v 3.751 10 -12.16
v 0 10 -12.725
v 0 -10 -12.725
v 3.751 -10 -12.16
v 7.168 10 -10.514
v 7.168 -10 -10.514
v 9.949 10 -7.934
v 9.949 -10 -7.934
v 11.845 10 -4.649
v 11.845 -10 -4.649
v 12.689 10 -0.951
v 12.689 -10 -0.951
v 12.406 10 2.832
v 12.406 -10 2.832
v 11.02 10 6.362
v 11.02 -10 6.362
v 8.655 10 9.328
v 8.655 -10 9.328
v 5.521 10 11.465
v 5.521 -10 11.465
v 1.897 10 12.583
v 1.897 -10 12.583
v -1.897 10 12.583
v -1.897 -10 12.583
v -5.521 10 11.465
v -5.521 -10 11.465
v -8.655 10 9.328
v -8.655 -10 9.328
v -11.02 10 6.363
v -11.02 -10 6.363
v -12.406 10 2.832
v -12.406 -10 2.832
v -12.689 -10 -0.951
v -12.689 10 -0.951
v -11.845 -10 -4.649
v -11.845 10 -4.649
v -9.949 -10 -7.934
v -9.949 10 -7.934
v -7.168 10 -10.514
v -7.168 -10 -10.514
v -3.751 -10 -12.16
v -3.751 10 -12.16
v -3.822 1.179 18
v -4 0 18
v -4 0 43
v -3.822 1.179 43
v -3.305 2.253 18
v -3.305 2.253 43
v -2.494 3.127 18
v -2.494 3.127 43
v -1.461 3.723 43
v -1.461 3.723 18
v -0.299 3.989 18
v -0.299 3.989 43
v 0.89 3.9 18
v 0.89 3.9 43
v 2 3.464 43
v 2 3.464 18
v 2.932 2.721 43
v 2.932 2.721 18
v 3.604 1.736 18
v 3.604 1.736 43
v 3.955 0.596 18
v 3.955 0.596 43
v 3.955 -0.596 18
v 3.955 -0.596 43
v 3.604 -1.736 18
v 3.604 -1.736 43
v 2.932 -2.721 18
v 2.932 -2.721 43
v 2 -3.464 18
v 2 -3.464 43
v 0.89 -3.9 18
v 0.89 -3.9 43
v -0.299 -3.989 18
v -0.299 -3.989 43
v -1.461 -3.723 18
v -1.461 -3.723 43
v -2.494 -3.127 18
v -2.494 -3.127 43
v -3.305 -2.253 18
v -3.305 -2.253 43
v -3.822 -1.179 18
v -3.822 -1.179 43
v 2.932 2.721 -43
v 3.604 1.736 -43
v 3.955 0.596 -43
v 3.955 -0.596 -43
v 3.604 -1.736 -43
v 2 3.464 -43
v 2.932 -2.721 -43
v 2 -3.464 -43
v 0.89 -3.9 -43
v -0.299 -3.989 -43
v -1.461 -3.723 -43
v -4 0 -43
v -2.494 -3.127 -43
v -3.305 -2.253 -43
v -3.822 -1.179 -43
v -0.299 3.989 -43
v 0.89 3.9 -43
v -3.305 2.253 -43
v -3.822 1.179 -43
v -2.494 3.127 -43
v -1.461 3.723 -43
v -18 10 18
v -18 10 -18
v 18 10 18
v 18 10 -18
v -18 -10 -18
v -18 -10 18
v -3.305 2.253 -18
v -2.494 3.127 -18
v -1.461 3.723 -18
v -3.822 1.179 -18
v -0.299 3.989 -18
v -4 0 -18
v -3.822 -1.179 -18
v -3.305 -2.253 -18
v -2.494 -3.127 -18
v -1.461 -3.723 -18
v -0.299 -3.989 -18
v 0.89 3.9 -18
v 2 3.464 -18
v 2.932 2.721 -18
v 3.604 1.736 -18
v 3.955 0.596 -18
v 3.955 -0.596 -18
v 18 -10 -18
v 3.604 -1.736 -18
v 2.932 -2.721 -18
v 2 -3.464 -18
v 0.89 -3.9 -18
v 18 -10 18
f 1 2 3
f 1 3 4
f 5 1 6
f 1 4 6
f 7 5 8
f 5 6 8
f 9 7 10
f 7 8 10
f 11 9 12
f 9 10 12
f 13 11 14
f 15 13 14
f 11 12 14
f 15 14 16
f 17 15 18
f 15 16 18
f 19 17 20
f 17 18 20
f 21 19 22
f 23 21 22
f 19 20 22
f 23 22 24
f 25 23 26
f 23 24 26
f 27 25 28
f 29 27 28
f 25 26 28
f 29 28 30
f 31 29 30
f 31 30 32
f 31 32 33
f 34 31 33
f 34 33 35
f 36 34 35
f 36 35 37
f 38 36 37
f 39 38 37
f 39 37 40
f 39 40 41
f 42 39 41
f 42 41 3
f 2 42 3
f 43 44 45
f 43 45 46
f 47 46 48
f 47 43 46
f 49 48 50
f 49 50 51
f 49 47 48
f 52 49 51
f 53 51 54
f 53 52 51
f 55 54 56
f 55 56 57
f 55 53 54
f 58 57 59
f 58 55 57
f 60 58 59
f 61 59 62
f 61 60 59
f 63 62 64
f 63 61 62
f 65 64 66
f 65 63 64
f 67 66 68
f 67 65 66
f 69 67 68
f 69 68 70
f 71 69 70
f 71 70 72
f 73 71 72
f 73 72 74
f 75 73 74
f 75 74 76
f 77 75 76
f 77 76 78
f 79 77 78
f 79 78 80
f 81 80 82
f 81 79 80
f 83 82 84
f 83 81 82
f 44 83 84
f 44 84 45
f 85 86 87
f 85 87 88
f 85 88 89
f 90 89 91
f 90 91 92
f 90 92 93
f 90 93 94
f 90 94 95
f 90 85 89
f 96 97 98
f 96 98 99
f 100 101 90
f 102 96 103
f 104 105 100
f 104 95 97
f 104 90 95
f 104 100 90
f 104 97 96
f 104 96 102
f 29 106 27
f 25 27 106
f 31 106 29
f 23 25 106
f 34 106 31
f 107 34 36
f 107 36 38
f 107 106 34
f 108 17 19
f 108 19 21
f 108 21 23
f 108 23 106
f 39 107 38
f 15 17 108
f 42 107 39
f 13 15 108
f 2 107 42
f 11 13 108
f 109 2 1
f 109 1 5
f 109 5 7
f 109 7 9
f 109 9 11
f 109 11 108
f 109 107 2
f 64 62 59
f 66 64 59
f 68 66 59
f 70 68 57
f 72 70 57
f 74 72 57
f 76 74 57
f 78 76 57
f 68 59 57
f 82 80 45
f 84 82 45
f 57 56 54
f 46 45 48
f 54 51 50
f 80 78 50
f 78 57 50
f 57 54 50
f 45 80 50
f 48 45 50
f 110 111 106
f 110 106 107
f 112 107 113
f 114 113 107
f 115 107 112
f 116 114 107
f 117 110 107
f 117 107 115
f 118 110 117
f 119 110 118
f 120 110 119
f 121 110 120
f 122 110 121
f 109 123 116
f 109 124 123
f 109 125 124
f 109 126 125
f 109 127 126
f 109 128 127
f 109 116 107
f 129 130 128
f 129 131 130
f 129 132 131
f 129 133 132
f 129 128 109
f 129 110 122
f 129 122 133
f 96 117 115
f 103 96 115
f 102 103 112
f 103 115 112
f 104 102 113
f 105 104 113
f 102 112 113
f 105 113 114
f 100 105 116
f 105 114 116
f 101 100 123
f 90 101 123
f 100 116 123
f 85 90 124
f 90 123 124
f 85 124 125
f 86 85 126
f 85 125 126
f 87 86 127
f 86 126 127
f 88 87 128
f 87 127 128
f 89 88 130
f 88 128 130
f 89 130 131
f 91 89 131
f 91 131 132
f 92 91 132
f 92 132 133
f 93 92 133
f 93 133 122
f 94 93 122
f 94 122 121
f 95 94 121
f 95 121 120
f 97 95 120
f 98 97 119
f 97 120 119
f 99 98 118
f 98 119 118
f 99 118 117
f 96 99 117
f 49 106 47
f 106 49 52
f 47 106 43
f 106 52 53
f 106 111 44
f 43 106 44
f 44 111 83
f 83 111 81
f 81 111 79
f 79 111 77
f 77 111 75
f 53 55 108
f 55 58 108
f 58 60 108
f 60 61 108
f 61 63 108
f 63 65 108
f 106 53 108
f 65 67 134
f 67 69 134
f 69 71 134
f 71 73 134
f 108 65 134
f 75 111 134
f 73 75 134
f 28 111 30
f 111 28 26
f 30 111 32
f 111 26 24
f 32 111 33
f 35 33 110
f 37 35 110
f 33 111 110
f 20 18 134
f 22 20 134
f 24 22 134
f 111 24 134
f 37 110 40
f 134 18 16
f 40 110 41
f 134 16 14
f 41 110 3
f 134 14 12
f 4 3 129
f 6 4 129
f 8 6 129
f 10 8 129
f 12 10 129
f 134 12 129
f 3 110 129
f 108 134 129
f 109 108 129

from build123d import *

# Parameters (mm, degrees)
BOSS_EXTRUDE1_DEPTH      = 10
BOSS_EXTRUDE1_DEPTH_BACK = 10
SKETCH1_W                = 36
SKETCH1_H                = 36
SKETCH2_R                = 12.725
CUT_EXTRUDE1_DEPTH       = 33.372828112
SKETCH5_R                = 4
BOSS_EXTRUDE2_DEPTH      = 25


with BuildPart() as part:
    # Sketch1 → Boss-Extrude1 (new, two sides: drawn at the far end of the back side and taken through both)
    with BuildSketch(Plane(origin=(0, 0, 0), x_dir=(1, 0, 0), z_dir=(0, 1, 0)).offset(-BOSS_EXTRUDE1_DEPTH_BACK)):
        Rectangle(SKETCH1_W, SKETCH1_H)
    extrude(amount=BOSS_EXTRUDE1_DEPTH + BOSS_EXTRUDE1_DEPTH_BACK)

    # Sketch2 → Cut-Extrude1 (cut, through all)
    with BuildSketch(Plane.XZ.offset(10)):
        Circle(SKETCH2_R)
    extrude(amount=-CUT_EXTRUDE1_DEPTH, mode=Mode.SUBTRACT)

    # Sketch5 → Boss-Extrude2 (add)
    with BuildSketch(Plane(origin=(0, 0, -18), x_dir=(-1, 0, 0), z_dir=(0, 0, -1))):
        Circle(SKETCH5_R)
    boss_extrude2 = extrude(amount=BOSS_EXTRUDE2_DEPTH)

    # Mirror1: Boss-Extrude2 across plane
    add(boss_extrude2.mirror(Plane.XY))


solid = part.part
